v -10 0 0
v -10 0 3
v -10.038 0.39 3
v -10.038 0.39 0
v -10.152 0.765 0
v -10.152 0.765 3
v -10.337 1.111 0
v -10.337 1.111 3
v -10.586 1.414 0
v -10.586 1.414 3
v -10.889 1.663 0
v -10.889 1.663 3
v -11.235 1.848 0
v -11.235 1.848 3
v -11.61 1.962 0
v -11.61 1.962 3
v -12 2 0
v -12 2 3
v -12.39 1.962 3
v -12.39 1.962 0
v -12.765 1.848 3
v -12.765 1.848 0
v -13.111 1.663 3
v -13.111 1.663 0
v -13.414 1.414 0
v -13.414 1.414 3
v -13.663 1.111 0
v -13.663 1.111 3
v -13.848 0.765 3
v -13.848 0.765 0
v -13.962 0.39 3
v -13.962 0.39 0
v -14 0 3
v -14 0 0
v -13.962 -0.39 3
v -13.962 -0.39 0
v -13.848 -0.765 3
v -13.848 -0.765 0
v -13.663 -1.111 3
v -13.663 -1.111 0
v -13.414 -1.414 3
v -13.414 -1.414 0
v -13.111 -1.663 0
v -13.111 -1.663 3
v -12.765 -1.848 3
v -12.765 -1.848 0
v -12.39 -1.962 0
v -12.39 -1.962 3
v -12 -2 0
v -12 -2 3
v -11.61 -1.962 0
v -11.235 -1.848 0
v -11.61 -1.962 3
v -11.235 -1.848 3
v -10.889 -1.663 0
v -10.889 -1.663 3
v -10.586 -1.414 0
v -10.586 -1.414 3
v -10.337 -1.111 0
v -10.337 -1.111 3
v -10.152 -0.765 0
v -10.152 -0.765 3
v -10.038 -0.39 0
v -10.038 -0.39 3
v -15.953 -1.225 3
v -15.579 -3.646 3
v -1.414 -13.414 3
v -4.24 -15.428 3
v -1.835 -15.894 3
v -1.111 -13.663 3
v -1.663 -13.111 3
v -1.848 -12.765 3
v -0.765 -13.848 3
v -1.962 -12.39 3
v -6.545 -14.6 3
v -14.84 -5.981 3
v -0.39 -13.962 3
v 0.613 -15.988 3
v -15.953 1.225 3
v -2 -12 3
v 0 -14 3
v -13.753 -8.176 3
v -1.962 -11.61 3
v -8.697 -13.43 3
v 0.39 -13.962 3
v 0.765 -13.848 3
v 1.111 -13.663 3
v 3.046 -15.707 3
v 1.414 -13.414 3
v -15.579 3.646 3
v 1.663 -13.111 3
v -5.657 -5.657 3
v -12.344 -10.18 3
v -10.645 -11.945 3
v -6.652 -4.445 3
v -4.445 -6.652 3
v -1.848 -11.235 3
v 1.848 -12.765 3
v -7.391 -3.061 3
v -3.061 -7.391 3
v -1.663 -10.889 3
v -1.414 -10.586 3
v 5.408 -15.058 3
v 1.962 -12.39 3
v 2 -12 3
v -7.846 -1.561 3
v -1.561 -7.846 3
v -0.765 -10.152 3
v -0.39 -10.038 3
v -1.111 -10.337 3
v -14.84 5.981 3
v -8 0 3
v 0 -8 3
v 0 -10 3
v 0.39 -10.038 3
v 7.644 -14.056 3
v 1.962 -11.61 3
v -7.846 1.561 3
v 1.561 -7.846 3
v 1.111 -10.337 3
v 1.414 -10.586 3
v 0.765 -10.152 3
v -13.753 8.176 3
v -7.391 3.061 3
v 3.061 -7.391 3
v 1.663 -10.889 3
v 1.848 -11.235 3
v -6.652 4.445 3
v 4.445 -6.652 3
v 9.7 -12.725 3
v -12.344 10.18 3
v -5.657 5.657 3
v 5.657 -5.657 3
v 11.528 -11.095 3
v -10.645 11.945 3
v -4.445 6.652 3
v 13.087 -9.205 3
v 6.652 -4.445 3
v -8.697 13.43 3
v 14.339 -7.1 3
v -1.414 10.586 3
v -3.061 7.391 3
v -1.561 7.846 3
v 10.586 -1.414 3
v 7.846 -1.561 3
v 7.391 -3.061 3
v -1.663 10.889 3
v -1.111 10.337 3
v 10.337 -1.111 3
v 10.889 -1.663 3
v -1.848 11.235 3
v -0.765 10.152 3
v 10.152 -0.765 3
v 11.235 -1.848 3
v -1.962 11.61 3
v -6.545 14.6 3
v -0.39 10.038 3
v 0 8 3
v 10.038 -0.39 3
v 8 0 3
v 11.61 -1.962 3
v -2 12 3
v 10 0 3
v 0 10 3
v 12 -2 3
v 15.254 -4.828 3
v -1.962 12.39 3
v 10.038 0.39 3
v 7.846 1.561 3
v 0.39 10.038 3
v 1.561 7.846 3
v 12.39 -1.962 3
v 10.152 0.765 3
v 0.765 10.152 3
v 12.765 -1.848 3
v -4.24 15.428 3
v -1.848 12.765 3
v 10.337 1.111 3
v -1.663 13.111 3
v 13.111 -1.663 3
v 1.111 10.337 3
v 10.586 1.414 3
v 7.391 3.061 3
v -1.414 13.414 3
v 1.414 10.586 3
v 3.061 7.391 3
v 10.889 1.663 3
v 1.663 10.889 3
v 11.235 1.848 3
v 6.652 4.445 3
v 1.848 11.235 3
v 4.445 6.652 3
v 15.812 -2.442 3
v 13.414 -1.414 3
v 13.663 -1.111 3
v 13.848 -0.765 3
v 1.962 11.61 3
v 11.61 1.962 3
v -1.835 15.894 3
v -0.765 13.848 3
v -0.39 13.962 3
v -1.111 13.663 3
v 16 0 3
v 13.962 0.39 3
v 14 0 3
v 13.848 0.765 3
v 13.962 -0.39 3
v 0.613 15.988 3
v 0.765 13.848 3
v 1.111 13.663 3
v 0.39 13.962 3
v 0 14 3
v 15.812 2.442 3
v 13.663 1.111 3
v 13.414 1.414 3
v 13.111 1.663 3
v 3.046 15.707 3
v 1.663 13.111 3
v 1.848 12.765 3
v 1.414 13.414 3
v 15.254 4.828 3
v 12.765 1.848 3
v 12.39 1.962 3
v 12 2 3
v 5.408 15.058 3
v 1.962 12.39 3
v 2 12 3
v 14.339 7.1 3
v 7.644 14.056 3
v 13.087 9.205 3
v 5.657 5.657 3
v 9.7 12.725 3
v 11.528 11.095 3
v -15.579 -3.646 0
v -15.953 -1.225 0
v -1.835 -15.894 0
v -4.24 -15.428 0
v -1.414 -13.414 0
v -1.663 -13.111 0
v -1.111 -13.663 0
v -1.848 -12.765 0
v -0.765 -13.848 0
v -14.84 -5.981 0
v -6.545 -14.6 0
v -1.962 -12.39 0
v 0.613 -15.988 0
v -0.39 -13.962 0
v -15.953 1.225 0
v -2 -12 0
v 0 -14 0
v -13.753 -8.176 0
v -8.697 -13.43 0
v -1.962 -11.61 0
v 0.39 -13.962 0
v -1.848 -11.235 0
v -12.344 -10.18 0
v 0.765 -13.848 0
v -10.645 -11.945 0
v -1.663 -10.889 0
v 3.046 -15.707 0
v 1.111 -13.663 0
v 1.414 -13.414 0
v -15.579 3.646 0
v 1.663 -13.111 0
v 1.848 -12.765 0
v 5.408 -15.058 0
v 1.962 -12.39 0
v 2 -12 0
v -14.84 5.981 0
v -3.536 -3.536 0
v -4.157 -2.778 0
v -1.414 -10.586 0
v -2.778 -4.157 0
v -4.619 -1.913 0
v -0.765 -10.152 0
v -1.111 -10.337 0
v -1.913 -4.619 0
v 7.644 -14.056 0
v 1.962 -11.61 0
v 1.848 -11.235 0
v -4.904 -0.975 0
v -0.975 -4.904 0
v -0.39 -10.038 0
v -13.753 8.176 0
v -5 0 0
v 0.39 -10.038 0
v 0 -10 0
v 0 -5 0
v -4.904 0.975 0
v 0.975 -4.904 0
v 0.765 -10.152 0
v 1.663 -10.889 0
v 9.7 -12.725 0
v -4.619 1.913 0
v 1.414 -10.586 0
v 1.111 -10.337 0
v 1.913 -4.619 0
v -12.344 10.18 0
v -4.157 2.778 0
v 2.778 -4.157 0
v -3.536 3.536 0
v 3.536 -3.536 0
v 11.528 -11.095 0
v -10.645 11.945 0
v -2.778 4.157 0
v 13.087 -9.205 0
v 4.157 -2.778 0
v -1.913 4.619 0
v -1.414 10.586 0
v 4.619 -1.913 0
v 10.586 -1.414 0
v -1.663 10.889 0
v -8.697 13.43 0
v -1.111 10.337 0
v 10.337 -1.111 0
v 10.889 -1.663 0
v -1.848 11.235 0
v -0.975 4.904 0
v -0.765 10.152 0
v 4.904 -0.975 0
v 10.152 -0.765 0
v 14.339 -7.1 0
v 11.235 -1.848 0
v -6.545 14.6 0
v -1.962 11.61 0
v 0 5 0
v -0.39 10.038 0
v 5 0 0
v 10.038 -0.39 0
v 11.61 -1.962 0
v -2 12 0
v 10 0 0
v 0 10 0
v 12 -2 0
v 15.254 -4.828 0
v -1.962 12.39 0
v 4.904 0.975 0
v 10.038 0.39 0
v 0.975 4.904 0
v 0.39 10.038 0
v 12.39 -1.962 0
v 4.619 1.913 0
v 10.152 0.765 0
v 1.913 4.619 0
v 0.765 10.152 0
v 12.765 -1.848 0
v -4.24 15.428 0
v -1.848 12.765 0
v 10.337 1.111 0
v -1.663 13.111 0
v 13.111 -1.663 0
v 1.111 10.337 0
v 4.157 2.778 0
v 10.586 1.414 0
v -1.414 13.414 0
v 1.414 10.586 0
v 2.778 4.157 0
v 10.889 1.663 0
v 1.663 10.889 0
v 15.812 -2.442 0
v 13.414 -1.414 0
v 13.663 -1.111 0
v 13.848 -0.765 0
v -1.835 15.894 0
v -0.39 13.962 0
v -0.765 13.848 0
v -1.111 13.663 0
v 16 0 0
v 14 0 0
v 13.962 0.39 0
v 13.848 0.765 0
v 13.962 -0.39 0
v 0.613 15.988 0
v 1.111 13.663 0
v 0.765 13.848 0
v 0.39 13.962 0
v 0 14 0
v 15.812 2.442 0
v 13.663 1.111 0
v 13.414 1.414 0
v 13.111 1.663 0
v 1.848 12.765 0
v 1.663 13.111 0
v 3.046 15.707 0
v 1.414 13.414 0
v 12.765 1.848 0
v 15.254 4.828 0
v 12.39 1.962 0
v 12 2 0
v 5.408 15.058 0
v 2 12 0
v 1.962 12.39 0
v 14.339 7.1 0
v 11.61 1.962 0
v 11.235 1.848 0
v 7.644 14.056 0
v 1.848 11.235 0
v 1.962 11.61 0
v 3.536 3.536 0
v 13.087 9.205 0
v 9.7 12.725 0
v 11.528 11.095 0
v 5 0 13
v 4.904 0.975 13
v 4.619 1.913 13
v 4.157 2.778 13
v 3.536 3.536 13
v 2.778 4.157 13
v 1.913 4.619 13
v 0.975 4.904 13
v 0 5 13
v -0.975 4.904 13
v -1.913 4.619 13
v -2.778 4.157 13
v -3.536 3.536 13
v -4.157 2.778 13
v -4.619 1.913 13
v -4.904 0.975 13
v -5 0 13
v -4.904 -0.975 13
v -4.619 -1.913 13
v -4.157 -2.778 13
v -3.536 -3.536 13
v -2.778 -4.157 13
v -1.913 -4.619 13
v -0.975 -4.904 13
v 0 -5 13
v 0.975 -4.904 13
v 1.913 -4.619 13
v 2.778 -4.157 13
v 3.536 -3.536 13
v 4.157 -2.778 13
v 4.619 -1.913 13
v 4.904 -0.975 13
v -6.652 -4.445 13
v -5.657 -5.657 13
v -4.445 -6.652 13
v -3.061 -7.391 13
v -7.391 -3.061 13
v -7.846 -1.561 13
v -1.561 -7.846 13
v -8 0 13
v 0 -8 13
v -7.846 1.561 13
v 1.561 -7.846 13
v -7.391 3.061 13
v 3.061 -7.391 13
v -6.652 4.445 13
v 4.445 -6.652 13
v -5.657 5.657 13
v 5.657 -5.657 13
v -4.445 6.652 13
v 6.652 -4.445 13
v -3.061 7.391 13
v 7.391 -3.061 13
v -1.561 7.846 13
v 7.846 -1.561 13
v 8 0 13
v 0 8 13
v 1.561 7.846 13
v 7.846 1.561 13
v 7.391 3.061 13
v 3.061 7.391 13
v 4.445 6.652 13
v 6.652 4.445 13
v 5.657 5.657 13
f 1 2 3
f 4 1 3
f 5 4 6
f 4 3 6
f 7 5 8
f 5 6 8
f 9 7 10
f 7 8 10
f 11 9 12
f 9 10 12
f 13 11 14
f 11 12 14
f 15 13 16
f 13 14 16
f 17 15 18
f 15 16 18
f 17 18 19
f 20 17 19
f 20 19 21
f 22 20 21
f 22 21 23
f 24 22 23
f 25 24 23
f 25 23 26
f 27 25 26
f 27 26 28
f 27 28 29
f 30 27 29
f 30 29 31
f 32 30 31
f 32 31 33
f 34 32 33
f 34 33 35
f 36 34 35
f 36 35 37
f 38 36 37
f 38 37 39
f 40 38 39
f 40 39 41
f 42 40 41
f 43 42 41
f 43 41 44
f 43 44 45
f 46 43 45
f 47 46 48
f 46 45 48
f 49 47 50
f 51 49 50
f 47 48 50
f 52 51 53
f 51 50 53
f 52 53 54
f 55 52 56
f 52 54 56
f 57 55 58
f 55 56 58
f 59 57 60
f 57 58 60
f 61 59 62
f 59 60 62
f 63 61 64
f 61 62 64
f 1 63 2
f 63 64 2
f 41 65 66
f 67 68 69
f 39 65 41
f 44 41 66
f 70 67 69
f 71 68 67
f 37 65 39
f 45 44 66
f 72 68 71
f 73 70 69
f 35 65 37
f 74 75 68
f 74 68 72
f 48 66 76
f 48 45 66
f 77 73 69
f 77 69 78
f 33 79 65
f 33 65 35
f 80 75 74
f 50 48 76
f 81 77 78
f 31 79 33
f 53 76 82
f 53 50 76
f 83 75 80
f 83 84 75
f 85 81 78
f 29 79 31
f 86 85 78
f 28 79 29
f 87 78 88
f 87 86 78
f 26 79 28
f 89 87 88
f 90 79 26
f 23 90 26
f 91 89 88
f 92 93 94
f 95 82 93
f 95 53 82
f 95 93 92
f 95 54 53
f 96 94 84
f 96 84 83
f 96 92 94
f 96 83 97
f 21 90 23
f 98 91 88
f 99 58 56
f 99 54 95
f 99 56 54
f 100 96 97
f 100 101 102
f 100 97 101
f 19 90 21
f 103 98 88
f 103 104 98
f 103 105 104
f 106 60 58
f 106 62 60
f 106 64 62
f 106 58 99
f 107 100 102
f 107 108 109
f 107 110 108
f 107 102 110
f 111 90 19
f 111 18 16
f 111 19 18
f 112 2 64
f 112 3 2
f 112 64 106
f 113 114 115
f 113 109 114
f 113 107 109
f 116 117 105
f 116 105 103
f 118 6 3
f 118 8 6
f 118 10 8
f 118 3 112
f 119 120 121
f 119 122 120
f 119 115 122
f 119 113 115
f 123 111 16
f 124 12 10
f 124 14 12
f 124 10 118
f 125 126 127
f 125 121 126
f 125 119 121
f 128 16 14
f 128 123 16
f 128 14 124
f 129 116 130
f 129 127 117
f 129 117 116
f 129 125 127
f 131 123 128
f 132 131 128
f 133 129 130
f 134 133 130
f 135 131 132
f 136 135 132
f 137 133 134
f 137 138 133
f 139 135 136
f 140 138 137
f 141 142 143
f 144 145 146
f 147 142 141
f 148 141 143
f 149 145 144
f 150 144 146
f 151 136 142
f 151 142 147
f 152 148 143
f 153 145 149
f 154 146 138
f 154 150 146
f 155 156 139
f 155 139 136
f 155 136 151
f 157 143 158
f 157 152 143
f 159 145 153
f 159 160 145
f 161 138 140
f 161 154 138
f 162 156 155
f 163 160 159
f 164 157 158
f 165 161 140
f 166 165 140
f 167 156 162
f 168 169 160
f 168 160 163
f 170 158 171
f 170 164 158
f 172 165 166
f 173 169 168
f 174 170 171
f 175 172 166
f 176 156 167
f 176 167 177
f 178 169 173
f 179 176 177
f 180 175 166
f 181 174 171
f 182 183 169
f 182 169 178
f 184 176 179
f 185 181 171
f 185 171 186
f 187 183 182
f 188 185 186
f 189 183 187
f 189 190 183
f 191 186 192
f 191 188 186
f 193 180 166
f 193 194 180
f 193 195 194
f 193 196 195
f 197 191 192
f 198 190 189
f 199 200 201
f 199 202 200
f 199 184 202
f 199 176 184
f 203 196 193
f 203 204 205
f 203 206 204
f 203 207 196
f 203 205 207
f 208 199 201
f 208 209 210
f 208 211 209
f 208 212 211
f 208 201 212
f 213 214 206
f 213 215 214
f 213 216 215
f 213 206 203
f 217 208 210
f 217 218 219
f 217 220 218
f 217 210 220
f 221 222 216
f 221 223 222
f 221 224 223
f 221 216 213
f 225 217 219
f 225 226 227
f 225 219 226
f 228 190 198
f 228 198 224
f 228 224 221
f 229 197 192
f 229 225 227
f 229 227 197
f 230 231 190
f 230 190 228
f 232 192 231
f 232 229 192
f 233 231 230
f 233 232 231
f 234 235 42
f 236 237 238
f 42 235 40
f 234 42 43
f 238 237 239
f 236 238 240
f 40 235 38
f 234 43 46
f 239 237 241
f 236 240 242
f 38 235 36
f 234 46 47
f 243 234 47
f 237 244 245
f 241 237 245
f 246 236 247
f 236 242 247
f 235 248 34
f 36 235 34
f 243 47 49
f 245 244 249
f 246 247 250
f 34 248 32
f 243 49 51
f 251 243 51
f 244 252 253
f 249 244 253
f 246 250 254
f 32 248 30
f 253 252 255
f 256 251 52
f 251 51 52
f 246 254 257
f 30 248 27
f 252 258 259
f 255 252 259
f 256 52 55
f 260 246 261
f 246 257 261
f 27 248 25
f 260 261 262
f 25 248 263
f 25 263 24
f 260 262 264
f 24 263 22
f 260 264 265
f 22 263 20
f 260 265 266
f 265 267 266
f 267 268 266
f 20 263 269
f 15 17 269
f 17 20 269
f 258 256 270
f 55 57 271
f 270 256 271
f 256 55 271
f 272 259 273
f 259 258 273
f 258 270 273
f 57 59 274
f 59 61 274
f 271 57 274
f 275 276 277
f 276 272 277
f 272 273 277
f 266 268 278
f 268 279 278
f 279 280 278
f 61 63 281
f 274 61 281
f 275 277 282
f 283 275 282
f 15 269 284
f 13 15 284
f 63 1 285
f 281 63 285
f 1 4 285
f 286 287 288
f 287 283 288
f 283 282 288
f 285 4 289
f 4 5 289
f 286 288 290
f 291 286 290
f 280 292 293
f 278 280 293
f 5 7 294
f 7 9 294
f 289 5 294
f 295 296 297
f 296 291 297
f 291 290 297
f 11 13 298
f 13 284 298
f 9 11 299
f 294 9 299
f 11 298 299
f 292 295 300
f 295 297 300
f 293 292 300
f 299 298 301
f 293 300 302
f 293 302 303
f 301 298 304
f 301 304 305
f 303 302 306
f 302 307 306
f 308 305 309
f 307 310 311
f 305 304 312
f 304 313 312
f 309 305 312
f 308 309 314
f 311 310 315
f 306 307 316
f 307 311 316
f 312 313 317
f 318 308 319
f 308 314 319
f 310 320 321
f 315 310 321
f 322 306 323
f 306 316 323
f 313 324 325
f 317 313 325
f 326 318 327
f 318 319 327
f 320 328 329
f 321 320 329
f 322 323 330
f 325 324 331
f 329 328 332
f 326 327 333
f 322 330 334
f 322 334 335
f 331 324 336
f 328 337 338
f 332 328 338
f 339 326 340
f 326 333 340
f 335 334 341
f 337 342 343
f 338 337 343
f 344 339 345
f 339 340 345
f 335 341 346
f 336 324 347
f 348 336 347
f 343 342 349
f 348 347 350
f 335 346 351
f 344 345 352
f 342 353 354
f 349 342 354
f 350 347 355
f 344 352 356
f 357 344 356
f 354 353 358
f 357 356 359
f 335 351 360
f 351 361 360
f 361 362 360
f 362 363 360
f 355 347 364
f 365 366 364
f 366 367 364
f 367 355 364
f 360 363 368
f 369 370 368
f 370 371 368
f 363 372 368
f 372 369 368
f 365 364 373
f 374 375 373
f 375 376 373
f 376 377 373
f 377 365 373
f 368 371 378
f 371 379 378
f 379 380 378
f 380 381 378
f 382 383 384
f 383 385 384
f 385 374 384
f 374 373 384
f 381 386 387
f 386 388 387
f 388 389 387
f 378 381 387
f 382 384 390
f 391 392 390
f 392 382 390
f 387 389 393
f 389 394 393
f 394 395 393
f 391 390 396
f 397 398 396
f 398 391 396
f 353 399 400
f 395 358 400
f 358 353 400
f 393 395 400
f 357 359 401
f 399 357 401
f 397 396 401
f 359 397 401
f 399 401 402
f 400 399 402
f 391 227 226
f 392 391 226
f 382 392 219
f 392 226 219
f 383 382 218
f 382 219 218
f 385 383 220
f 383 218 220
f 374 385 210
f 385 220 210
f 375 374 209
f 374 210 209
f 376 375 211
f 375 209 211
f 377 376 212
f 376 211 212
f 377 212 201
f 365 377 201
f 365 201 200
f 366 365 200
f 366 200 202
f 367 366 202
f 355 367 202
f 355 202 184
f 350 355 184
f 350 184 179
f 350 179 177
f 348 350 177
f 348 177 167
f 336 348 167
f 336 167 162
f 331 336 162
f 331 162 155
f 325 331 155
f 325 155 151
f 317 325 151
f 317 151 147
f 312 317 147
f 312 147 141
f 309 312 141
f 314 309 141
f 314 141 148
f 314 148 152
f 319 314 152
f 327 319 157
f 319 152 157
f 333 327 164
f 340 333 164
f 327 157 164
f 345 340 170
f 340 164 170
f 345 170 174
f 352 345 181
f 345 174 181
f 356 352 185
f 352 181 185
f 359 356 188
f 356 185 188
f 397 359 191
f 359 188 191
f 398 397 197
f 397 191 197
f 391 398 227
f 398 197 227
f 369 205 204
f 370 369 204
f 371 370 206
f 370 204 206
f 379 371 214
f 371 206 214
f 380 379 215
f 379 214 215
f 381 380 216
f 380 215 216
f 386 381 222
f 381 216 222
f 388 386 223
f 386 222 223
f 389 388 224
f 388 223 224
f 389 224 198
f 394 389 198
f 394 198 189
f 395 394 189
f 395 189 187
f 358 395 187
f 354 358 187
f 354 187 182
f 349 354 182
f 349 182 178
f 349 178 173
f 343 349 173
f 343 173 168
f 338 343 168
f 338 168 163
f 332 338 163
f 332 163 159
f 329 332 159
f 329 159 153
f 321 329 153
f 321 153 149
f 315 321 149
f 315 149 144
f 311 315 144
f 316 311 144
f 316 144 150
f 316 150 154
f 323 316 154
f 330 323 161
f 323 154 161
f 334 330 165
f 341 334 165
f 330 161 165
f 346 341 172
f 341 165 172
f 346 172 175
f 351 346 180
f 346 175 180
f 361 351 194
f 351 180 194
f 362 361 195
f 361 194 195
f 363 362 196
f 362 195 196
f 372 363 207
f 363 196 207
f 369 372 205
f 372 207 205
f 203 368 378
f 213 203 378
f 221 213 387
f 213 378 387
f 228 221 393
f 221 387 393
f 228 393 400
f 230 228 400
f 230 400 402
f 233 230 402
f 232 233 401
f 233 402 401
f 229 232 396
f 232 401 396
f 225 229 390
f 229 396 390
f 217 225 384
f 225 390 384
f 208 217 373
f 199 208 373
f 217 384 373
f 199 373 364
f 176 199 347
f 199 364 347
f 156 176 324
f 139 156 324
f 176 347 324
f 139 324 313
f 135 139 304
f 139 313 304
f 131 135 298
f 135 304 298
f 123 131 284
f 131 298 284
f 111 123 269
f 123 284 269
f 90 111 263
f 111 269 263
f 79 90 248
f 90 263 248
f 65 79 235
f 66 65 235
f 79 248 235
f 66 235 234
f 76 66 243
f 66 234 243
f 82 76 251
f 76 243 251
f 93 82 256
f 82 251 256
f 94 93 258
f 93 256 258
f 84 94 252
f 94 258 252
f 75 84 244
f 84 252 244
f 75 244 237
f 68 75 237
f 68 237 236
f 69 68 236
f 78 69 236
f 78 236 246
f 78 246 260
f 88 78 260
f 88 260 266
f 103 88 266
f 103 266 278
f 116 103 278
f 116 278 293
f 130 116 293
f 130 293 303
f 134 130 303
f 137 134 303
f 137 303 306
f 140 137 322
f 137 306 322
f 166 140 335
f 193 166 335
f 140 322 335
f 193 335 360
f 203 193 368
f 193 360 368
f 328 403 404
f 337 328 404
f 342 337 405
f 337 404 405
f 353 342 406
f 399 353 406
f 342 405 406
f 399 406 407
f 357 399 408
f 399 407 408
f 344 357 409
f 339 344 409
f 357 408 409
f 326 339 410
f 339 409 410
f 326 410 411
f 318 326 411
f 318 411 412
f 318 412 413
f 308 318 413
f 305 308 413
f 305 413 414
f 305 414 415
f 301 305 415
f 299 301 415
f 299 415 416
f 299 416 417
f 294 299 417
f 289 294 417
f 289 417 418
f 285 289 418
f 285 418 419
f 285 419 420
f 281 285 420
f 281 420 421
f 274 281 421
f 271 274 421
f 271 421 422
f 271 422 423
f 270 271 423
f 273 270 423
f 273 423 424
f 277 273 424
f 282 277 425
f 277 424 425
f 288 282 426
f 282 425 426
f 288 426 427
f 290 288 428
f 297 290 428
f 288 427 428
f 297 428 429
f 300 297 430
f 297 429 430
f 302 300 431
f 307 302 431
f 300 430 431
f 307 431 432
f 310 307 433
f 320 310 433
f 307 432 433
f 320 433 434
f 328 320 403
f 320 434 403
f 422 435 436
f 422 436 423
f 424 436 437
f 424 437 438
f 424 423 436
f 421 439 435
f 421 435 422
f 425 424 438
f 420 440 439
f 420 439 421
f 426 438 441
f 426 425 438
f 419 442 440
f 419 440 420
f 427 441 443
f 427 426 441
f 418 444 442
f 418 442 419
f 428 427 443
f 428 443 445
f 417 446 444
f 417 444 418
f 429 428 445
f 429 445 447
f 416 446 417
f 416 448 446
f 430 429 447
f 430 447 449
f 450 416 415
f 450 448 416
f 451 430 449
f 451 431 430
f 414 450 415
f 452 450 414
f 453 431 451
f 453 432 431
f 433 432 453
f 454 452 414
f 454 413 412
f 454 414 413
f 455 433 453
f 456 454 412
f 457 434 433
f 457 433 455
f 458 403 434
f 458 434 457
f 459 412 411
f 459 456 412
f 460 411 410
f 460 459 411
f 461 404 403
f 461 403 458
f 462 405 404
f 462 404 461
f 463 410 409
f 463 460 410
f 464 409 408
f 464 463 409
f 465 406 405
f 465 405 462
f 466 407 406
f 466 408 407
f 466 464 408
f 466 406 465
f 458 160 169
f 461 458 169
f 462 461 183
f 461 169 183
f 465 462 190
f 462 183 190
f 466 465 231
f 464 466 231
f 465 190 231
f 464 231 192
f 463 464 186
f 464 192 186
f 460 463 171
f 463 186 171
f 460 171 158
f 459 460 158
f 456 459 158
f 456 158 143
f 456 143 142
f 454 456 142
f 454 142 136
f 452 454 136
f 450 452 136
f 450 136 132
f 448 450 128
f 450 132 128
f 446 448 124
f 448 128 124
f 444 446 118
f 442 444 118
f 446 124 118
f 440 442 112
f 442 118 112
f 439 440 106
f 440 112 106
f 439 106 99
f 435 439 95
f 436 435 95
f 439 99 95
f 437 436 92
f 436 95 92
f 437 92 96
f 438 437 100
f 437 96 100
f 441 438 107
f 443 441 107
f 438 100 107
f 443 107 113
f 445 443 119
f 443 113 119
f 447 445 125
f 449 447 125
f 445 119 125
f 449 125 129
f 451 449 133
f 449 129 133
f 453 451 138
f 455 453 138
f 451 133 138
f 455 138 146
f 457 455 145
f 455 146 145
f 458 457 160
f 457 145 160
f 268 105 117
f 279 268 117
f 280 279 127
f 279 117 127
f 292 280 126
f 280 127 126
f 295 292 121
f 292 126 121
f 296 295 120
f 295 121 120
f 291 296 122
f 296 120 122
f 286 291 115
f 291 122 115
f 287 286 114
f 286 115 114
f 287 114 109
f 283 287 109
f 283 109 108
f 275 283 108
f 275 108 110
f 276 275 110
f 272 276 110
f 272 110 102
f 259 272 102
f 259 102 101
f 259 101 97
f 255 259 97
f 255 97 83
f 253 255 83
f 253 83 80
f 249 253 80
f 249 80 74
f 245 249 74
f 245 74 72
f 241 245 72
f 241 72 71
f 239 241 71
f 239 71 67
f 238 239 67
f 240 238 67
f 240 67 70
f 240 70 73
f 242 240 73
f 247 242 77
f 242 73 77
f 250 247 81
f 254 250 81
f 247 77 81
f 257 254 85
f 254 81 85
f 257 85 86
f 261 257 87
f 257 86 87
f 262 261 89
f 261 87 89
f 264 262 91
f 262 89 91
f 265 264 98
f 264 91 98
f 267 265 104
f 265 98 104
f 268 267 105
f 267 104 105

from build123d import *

# Parameters (mm, degrees)
SKETCH_1_R          = 16
EXTRUDE_1_DEPTH     = 3
SKETCH_2_R          = 8
EXTRUDE_2_DEPTH     = 10
CUT_EXTRUDE_1_REACH = 28.096
SKETCH_3_R          = 5
SKETCH_3_R_2        = 2


with BuildPart() as part:
    # 草图1 → 凸台-拉伸1 (new body)
    with BuildSketch(Plane.XY):
        Circle(SKETCH_1_R)
    extrude(amount=EXTRUDE_1_DEPTH)

    # 草图2 → 凸台-拉伸2 (add)
    with BuildSketch(Plane.XY.offset(3)):
        Circle(SKETCH_2_R)
    extrude(amount=EXTRUDE_2_DEPTH)

    # 草图3 → 切除-拉伸1 (cut, up to next)
    with BuildSketch(Plane.XY.offset(13), mode=Mode.PRIVATE) as cut_extrude_1_sk1:
        Circle(SKETCH_3_R)
    cut_extrude_1_tool1 = extrude(cut_extrude_1_sk1.sketch, amount=-CUT_EXTRUDE_1_REACH, mode=Mode.PRIVATE) & part.part
    # 草图3 → 切除-拉伸1 (cut, up to next)
    with BuildSketch(Plane.XY.offset(13), mode=Mode.PRIVATE) as cut_extrude_1_sk2:
        with Locations((0, 12)):
            Circle(SKETCH_3_R_2)
    cut_extrude_1_tool2 = extrude(cut_extrude_1_sk2.sketch, amount=-CUT_EXTRUDE_1_REACH, mode=Mode.PRIVATE) & part.part
    # 草图3 → 切除-拉伸1 (cut, up to next)
    with BuildSketch(Plane.XY.offset(13), mode=Mode.PRIVATE) as cut_extrude_1_sk3:
        with Locations((12, 0)):
            Circle(SKETCH_3_R_2)
    cut_extrude_1_tool3 = extrude(cut_extrude_1_sk3.sketch, amount=-CUT_EXTRUDE_1_REACH, mode=Mode.PRIVATE) & part.part
    # 草图3 → 切除-拉伸1 (cut, up to next)
    with BuildSketch(Plane.XY.offset(13), mode=Mode.PRIVATE) as cut_extrude_1_sk4:
        with Locations((0, -12)):
            Circle(SKETCH_3_R_2)
    cut_extrude_1_tool4 = extrude(cut_extrude_1_sk4.sketch, amount=-CUT_EXTRUDE_1_REACH, mode=Mode.PRIVATE) & part.part
    # 草图3 → 切除-拉伸1 (cut, up to next)
    with BuildSketch(Plane.XY.offset(13), mode=Mode.PRIVATE) as cut_extrude_1_sk5:
        with Locations((-12, 0)):
            Circle(SKETCH_3_R_2)
    cut_extrude_1_tool5 = extrude(cut_extrude_1_sk5.sketch, amount=-CUT_EXTRUDE_1_REACH, mode=Mode.PRIVATE) & part.part
    add(cut_extrude_1_tool1.solids().sort_by_distance((0, 0, 13))[0], mode=Mode.SUBTRACT)
    add(cut_extrude_1_tool2.solids().sort_by_distance((0, 12, 13))[0], mode=Mode.SUBTRACT)
    add(cut_extrude_1_tool3.solids().sort_by_distance((12, 0, 13))[0], mode=Mode.SUBTRACT)
    add(cut_extrude_1_tool4.solids().sort_by_distance((0, -12, 13))[0], mode=Mode.SUBTRACT)
    add(cut_extrude_1_tool5.solids().sort_by_distance((-12, 0, 13))[0], mode=Mode.SUBTRACT)


solid = part.part
